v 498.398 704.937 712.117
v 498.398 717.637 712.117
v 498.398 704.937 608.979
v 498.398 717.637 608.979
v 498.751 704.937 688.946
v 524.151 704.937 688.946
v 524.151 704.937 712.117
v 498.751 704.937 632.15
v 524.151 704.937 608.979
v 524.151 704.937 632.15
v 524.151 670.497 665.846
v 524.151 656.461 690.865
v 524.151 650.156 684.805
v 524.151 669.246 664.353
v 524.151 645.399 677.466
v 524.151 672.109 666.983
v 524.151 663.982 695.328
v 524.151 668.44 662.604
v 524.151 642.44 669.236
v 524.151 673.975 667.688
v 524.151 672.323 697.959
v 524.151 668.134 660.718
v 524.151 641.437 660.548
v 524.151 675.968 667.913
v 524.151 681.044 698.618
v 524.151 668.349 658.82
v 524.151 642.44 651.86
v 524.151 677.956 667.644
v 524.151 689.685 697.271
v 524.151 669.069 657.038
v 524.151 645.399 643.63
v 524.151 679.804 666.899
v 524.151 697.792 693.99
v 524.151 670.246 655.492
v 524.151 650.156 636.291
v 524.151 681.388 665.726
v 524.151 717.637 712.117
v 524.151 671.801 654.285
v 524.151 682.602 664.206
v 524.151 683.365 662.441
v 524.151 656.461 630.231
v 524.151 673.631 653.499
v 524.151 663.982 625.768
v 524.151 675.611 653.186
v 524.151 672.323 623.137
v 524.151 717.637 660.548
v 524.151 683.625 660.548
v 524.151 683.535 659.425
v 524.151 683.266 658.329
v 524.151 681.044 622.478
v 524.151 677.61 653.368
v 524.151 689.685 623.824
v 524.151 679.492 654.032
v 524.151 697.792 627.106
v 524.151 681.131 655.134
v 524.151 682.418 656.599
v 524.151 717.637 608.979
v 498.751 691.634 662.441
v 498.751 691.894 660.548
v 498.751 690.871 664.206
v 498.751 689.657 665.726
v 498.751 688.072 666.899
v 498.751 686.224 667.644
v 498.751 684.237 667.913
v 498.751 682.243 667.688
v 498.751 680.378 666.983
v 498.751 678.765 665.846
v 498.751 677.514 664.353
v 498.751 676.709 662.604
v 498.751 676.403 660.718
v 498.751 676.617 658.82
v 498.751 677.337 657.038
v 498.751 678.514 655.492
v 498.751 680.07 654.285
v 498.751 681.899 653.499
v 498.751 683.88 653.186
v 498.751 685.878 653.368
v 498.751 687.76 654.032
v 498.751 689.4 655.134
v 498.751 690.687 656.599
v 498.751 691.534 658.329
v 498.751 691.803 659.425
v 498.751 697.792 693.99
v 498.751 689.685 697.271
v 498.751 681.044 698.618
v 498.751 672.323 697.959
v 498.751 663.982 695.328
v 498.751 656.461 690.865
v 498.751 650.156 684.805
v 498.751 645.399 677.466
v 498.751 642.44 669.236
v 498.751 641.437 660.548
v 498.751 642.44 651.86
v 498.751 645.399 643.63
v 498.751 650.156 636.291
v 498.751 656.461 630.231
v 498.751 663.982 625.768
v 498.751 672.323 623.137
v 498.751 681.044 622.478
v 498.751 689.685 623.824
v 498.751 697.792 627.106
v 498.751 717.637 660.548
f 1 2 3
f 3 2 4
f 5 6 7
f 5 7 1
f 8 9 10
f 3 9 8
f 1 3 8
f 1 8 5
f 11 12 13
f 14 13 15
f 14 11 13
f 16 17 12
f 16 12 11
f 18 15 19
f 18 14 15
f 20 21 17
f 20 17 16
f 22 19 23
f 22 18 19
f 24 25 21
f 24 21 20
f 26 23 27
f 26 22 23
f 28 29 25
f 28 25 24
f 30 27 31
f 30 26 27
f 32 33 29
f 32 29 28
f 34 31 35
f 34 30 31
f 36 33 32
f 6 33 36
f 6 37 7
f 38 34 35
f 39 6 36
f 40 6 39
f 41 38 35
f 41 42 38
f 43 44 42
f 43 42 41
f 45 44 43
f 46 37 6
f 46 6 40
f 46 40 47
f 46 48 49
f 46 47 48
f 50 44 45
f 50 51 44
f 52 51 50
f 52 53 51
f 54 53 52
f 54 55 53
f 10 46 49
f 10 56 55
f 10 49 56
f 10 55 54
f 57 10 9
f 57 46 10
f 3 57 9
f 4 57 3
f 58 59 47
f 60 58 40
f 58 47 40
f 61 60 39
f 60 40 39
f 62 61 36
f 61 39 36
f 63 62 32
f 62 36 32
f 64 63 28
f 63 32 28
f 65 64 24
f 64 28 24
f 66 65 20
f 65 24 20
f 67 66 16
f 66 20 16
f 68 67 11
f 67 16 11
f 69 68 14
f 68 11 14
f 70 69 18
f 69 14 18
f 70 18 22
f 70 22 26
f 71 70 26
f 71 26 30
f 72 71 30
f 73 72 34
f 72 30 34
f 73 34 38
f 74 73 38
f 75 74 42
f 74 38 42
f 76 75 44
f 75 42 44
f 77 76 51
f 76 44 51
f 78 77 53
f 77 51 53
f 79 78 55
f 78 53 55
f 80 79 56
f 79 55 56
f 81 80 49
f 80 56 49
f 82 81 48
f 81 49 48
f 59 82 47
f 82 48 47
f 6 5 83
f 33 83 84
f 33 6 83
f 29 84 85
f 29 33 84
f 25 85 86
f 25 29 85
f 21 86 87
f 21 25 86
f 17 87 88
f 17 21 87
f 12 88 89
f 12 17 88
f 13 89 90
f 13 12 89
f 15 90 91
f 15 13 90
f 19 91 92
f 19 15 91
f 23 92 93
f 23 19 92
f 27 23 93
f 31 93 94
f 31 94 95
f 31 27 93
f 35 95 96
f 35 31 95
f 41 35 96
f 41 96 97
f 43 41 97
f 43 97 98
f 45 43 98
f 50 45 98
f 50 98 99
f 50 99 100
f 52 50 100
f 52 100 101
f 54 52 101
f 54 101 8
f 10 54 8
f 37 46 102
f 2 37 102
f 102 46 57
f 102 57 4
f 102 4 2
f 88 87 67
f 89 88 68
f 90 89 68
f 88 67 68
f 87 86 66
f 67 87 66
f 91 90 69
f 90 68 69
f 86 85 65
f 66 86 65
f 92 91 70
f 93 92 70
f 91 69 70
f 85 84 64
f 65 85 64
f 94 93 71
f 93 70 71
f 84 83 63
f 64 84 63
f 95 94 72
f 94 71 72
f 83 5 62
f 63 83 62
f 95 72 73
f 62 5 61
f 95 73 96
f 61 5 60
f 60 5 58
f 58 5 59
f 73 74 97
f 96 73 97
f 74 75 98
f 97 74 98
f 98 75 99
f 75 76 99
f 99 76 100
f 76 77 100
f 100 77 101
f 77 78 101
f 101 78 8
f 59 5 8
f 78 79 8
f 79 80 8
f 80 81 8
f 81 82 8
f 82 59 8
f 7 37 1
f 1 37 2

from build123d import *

# Parameters (mm, degrees)
SKETCH3_W            = 25.753050404
SKETCH3_H            = 103.137359271
BOSS_EXTRUDE1_DEPTH  = 12.7
SKETCH4_R            = 38.1
BOSS_EXTRUDE2_DEPTH  = 25.4
CUT_SWEEP1_PROFILE_R = 7.366


with BuildPart() as part:
    # Sketch3 → Boss-Extrude1 (new body)
    with BuildSketch(Plane(origin=(0, 717.636591226, 0), x_dir=(-1, 0, 0), z_dir=(0, -1, 0))):
        with Locations((-511.2749233, -660.547915429)):
            Rectangle(SKETCH3_W, SKETCH3_H)
    extrude(amount=BOSS_EXTRUDE1_DEPTH)

    # Sketch4 → Boss-Extrude2 (add)
    with BuildSketch(Plane(origin=(524.151448502, 0, 0), x_dir=(0, 0, -1), z_dir=(1, 0, 0))):
        with Locations((-660.547915428, 679.536591226)):
            Circle(SKETCH4_R)
    extrude(amount=-BOSS_EXTRUDE2_DEPTH)

    # Cut-Sweep1: sweep along a path in Sketch5
    with BuildLine(Plane.XY.offset(660.547915428)) as cut_sweep1_path:
        Line((472.45049051, 692.709335123), (547.766548789, 668.191368615))
    # Cut-Sweep1 profile (on start of the path) → Cut-Sweep1 (sweep, cut)
    with BuildSketch(Plane(origin=(472.45049051, 692.709335123, 660.547915428), x_dir=(0.309545628, 0.95088459, 0), z_dir=(0.95088459, -0.309545628, 0))):
        Circle(CUT_SWEEP1_PROFILE_R)
    sweep(path=cut_sweep1_path.line, mode=Mode.SUBTRACT)


solid = part.part
